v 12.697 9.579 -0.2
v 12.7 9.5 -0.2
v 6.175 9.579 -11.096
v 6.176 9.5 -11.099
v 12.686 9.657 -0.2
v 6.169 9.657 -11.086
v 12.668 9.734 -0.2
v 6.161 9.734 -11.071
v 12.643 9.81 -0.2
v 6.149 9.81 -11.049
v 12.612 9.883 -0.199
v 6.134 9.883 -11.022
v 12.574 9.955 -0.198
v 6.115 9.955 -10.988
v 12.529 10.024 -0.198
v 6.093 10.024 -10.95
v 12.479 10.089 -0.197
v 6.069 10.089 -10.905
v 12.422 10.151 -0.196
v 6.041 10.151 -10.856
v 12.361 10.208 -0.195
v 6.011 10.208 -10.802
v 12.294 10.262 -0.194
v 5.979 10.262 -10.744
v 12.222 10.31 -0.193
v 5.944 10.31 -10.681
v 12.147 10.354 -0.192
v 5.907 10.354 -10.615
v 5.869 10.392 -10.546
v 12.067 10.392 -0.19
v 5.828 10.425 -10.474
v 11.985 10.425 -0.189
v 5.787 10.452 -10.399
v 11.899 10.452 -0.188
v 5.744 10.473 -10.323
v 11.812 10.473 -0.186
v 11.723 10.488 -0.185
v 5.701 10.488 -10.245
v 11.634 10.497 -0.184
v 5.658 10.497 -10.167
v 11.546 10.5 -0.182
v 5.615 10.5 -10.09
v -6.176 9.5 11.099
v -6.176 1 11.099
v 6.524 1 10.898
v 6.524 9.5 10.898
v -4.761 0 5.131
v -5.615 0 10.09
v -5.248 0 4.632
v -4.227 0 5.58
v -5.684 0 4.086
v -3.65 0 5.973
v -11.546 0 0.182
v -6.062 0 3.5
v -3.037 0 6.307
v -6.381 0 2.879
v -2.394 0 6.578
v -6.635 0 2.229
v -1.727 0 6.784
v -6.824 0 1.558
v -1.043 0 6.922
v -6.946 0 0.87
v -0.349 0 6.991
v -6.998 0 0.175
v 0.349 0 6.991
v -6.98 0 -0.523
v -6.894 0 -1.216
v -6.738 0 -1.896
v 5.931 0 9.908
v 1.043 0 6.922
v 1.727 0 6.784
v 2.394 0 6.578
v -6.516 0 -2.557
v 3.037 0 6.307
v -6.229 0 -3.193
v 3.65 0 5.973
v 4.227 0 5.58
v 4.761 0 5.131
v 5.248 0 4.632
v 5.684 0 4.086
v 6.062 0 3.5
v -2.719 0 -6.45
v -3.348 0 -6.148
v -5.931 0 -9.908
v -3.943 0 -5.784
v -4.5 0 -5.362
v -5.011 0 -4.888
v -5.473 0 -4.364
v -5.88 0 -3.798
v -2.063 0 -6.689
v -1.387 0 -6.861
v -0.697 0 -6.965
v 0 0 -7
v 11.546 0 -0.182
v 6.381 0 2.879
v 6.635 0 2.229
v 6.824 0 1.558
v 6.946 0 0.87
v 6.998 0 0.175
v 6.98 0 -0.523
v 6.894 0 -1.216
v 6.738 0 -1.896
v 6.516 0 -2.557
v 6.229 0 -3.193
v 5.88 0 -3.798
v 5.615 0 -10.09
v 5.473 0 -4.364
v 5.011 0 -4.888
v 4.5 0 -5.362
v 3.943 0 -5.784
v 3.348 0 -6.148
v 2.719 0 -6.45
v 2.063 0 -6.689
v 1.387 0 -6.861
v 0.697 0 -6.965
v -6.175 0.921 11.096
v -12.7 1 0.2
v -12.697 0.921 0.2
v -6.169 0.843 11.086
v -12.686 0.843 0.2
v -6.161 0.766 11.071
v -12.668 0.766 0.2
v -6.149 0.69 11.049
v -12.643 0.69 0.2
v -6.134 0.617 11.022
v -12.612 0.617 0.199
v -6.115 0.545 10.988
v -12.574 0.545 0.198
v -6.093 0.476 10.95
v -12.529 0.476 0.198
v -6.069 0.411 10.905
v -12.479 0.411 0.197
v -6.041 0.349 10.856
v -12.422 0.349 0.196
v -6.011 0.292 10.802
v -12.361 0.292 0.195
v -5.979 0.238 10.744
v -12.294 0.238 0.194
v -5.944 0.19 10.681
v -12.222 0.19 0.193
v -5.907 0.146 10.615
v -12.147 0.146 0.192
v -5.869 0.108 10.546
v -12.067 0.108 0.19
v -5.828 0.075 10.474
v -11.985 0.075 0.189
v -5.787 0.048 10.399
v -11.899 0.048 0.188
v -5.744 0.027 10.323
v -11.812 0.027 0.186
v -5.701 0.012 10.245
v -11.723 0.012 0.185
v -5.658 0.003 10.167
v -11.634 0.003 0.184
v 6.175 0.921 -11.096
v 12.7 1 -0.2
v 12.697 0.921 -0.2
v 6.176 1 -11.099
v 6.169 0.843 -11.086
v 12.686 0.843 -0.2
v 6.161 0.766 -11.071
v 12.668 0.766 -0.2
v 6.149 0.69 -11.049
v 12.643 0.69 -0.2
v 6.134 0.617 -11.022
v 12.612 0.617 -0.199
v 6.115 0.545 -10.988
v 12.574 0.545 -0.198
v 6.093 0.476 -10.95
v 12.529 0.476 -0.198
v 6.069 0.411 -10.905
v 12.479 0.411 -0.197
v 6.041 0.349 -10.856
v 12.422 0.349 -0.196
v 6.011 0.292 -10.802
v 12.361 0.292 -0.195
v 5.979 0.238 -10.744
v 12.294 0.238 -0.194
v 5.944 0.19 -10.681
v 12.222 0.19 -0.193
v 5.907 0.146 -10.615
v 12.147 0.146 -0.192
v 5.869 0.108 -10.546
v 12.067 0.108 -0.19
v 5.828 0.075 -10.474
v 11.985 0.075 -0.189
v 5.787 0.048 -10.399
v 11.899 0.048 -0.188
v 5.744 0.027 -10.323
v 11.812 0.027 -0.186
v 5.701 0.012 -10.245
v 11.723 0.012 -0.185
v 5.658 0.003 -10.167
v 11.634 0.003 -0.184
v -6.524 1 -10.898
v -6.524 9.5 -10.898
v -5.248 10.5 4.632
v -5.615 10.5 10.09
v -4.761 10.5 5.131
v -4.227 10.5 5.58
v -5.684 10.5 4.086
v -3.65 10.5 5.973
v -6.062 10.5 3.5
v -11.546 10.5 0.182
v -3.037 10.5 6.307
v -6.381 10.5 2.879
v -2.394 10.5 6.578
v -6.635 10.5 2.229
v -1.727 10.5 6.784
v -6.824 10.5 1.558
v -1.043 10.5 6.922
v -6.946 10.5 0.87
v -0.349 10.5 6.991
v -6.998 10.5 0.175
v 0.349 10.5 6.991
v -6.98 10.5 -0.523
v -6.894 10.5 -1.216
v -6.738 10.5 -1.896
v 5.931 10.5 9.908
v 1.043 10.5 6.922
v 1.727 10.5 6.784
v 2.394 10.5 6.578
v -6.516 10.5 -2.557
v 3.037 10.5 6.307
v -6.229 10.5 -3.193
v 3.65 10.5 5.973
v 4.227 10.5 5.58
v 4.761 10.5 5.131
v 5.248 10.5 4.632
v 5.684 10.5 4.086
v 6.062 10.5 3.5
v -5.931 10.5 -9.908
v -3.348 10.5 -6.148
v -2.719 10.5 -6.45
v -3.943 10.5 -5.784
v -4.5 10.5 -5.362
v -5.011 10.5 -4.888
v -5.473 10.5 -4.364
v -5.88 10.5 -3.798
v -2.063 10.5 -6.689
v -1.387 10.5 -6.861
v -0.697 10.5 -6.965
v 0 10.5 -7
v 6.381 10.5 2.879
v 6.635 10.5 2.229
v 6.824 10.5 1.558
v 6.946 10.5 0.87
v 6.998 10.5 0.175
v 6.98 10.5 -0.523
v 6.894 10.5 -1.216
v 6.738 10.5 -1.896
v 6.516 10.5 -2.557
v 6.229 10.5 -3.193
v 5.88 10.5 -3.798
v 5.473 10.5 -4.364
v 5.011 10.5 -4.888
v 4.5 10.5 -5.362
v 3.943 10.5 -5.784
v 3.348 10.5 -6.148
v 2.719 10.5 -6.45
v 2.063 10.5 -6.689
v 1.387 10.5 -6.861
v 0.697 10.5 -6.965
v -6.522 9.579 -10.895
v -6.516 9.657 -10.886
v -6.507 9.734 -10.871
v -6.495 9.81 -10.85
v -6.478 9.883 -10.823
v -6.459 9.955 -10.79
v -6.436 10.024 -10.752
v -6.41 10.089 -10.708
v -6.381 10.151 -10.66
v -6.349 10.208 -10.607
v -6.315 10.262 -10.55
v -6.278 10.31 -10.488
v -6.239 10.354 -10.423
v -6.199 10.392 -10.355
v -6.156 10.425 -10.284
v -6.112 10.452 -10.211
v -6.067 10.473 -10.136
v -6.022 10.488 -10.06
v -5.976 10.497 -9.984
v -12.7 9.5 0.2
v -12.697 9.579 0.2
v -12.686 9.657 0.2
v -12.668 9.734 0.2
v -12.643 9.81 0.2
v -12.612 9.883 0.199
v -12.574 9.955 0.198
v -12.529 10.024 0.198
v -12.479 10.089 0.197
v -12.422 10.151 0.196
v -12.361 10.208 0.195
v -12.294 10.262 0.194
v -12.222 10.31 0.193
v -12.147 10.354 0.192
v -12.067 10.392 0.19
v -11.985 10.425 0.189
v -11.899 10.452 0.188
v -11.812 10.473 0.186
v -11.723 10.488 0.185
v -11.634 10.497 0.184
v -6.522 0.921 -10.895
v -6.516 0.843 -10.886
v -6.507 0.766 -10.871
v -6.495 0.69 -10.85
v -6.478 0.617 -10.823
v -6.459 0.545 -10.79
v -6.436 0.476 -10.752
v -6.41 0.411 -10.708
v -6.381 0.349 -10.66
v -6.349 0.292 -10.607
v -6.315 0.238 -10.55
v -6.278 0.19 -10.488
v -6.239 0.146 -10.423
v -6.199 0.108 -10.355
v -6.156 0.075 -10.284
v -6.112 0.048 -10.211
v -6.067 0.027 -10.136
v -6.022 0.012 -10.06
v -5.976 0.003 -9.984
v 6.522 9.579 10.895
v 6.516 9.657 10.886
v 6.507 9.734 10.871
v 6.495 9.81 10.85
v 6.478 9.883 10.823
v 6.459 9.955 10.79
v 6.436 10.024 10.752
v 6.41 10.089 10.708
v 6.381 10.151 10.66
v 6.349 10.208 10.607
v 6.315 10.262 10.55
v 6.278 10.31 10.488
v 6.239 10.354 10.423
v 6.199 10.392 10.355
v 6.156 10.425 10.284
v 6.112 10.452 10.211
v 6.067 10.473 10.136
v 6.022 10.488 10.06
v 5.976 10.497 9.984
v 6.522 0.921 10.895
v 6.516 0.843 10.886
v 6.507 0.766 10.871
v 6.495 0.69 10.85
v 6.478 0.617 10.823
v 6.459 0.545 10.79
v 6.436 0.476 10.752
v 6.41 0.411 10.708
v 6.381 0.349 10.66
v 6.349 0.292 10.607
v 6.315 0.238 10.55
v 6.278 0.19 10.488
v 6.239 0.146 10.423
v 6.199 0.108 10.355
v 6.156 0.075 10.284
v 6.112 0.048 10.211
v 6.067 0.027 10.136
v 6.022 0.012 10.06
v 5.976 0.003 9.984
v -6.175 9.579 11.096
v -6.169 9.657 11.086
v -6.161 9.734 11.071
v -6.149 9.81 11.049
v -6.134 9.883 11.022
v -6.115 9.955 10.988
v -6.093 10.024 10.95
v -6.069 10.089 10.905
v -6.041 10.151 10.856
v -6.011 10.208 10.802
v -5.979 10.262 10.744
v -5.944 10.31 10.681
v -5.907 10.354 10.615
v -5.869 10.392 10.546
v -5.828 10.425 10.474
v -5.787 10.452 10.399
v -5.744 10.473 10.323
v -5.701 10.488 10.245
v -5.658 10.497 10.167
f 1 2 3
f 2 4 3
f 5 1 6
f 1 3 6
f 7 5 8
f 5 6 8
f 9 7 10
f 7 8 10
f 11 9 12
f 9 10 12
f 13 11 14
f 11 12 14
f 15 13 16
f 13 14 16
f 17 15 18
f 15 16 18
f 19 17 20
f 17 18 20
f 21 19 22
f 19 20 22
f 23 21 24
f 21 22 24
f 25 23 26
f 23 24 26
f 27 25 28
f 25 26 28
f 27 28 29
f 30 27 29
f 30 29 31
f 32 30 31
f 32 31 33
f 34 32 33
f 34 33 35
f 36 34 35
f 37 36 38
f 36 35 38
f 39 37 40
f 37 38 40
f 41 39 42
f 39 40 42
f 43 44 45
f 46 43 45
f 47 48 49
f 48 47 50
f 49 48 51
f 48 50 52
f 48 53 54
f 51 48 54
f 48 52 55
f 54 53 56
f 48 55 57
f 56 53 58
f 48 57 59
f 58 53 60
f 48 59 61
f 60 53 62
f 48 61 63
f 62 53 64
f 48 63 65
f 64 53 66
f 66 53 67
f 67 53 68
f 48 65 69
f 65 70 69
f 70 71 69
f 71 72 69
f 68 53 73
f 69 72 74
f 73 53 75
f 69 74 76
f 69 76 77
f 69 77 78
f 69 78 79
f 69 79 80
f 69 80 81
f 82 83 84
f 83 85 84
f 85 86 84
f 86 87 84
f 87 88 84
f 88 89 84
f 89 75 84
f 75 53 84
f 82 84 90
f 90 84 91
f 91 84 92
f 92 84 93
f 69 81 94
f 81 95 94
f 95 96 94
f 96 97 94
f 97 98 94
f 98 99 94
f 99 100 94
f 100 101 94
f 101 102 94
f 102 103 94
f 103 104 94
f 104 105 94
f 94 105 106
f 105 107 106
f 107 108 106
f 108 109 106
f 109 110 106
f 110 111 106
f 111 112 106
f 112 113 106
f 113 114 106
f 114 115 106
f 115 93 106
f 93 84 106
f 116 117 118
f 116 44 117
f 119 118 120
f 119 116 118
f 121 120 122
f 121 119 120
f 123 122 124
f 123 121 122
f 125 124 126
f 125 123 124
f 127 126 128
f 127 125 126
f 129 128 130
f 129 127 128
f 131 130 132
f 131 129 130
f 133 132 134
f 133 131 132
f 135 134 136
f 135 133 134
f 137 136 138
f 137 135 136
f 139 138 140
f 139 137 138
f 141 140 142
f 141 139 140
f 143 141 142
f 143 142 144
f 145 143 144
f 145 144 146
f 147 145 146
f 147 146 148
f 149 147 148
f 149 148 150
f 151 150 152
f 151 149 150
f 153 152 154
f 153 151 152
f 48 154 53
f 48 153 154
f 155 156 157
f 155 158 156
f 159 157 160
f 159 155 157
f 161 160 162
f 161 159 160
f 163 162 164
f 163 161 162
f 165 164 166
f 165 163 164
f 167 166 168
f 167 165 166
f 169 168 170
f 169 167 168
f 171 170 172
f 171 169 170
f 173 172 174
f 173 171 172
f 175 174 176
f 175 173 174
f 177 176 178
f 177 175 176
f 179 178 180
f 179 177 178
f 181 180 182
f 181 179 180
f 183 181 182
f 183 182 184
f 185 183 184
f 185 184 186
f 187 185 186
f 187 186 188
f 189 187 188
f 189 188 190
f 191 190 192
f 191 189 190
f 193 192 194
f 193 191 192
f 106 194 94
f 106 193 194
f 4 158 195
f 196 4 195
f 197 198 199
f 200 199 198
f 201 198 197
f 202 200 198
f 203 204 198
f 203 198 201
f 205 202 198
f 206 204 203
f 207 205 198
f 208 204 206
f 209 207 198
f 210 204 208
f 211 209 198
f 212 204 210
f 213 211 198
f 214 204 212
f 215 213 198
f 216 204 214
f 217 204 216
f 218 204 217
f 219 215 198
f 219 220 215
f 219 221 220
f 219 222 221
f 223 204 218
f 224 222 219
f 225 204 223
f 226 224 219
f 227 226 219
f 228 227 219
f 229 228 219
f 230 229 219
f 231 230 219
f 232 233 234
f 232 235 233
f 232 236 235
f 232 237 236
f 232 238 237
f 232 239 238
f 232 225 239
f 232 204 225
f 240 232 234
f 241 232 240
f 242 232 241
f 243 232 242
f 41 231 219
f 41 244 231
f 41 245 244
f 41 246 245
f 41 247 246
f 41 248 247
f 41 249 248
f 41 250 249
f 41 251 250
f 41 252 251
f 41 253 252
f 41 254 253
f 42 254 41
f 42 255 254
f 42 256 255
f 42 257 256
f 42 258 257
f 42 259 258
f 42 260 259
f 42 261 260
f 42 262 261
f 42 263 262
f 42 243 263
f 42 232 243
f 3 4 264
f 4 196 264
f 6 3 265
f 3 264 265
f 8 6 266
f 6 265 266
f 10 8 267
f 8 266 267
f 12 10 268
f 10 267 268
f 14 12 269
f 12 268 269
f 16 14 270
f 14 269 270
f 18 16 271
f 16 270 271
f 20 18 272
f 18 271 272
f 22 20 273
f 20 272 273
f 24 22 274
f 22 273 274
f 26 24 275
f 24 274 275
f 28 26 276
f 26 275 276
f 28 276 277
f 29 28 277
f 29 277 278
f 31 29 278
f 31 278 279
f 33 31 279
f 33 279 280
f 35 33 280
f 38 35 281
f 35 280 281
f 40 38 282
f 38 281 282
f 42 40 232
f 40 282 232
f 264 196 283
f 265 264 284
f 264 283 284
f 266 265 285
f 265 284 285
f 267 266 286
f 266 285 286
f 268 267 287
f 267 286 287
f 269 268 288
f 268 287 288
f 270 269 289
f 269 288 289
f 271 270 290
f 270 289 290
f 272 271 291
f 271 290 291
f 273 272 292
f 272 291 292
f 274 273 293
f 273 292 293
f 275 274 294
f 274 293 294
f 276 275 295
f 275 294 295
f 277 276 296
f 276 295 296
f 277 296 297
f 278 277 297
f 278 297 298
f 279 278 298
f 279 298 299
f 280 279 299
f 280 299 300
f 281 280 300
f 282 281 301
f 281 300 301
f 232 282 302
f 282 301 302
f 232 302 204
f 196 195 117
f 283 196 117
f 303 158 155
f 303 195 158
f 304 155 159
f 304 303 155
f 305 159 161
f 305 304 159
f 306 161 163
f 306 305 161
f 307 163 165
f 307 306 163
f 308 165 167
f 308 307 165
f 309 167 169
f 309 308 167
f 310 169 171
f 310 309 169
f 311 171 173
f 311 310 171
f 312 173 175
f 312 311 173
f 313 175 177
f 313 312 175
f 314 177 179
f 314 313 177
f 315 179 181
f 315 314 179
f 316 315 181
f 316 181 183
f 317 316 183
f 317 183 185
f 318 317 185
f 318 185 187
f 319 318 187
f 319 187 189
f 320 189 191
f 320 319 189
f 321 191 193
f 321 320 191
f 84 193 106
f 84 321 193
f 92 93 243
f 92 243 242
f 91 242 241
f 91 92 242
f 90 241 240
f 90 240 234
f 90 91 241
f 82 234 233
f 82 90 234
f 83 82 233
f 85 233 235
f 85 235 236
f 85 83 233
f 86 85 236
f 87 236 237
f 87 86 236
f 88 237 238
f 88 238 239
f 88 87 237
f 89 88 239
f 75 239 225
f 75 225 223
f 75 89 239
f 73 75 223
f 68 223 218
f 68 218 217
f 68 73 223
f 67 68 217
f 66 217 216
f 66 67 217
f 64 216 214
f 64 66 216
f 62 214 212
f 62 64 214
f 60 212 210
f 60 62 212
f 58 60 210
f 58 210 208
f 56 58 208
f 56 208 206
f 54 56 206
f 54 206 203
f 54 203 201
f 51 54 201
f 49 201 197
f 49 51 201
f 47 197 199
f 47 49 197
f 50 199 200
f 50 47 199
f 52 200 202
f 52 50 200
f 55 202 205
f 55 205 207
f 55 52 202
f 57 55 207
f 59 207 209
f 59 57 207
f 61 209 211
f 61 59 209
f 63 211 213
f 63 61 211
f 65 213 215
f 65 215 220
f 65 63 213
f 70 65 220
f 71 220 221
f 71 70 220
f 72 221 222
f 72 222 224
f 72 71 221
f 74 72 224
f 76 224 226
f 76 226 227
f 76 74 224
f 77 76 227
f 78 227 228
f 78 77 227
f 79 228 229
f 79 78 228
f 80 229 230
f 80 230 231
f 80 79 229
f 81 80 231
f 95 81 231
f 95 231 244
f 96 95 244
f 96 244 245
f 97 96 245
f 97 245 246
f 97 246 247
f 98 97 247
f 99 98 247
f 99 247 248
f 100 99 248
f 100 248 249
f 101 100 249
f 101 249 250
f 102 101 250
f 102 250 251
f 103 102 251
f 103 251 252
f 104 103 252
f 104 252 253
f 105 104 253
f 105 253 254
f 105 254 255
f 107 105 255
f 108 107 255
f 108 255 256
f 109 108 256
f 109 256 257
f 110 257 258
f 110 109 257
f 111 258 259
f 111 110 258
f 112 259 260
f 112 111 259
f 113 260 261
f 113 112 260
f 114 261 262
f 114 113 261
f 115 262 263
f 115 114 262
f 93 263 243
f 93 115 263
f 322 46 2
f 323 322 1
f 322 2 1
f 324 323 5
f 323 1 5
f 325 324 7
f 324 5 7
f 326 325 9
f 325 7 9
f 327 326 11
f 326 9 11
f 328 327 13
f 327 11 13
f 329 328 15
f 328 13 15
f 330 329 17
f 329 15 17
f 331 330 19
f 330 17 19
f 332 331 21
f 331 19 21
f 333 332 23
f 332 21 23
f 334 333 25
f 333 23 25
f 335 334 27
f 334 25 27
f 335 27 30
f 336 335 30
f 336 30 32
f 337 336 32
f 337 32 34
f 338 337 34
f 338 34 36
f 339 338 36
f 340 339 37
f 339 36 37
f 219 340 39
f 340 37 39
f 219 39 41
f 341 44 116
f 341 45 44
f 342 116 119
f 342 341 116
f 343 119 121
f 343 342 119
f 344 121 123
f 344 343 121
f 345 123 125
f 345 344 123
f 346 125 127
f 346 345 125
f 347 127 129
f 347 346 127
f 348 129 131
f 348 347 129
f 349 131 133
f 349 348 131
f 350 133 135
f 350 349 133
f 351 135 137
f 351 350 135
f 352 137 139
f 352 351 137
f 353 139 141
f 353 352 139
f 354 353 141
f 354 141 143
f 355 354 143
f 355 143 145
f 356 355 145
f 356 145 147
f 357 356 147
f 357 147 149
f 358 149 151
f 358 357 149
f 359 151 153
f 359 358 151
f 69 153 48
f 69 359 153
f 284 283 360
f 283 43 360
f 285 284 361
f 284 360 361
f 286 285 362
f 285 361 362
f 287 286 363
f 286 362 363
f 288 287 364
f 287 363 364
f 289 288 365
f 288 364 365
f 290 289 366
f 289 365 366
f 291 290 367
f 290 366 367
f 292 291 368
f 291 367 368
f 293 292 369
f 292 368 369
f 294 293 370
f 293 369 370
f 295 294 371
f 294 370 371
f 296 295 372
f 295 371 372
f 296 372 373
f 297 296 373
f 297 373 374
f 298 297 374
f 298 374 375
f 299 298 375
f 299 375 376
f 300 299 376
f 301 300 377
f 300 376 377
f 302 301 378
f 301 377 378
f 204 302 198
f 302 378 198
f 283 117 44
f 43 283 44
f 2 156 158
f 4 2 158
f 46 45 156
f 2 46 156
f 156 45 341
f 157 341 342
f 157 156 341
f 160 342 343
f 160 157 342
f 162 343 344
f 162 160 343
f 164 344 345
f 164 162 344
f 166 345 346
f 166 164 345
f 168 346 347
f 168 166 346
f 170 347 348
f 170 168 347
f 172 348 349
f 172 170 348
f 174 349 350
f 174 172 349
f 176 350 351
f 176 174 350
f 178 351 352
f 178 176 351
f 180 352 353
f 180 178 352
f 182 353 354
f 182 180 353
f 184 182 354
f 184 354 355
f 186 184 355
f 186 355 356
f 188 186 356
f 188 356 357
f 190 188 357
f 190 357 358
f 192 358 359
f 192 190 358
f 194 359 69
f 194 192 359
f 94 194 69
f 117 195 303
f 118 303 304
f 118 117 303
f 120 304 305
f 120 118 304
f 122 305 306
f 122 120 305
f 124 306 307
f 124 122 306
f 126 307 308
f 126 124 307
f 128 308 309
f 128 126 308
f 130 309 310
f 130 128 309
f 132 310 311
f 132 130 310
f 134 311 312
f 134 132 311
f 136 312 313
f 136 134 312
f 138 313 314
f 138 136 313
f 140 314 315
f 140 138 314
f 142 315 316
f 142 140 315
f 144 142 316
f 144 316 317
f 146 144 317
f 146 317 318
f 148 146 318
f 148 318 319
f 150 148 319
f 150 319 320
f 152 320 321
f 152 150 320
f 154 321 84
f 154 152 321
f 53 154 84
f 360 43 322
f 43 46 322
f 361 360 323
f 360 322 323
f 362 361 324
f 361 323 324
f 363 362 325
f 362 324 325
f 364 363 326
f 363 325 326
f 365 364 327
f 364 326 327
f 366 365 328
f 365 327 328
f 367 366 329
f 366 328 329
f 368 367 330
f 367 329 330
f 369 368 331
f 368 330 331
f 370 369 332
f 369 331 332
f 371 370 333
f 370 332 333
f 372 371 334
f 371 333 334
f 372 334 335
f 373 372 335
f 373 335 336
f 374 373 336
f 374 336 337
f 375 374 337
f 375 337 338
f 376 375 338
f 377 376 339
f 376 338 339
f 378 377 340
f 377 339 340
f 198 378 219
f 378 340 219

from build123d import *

# Parameters (mm, degrees)
SKETCH_1_R      = 7
EXTRUDE_1_DEPTH = 10.5
FILLET_1_R      = 1


with BuildPart() as part:
    # Эскиз1 → Вытянуть1 (new body)
    with BuildSketch(Plane(origin=(0, 0, 0), x_dir=(1, 0, 0), z_dir=(0, 1, 0))):
        Polygon((6.523683625, -10.898389115), (12.700123646, 0.200481188), (6.176440021, 11.098870303), (-6.523683625, 10.898389115), (-12.700123646, -0.200481188), (-6.176440021, -11.098870303), align=None)
        with Locations(Location((0, 0, 0), (0, 0, 90))):
            Circle(SKETCH_1_R, mode=Mode.SUBTRACT)
    extrude(amount=EXTRUDE_1_DEPTH)

    # Скругление1
    fillet_1_edges = [part.edges().sort_by_distance(p)[0] for p in [
        (9.438281834, 10.5, -5.649675745),
        (-0.173621802, 10.5, -10.998629709),
        (-9.611903636, 10.5, -5.348953963),
        (-9.438281834, 10.5, 5.649675745),
        (0.173621802, 10.5, 10.998629709),
        (-9.438281834, 0, 5.649675745),
        (-9.611903636, 0, -5.348953963),
        (-0.173621802, 0, -10.998629709),
        (9.611903636, 10.5, 5.348953963),
        (9.438281834, 0, -5.649675745),
        (9.611903636, 0, 5.348953963),
        (0.173621802, 0, 10.998629709),
    ]]
    fillet(fillet_1_edges, radius=FILLET_1_R)


solid = part.part
